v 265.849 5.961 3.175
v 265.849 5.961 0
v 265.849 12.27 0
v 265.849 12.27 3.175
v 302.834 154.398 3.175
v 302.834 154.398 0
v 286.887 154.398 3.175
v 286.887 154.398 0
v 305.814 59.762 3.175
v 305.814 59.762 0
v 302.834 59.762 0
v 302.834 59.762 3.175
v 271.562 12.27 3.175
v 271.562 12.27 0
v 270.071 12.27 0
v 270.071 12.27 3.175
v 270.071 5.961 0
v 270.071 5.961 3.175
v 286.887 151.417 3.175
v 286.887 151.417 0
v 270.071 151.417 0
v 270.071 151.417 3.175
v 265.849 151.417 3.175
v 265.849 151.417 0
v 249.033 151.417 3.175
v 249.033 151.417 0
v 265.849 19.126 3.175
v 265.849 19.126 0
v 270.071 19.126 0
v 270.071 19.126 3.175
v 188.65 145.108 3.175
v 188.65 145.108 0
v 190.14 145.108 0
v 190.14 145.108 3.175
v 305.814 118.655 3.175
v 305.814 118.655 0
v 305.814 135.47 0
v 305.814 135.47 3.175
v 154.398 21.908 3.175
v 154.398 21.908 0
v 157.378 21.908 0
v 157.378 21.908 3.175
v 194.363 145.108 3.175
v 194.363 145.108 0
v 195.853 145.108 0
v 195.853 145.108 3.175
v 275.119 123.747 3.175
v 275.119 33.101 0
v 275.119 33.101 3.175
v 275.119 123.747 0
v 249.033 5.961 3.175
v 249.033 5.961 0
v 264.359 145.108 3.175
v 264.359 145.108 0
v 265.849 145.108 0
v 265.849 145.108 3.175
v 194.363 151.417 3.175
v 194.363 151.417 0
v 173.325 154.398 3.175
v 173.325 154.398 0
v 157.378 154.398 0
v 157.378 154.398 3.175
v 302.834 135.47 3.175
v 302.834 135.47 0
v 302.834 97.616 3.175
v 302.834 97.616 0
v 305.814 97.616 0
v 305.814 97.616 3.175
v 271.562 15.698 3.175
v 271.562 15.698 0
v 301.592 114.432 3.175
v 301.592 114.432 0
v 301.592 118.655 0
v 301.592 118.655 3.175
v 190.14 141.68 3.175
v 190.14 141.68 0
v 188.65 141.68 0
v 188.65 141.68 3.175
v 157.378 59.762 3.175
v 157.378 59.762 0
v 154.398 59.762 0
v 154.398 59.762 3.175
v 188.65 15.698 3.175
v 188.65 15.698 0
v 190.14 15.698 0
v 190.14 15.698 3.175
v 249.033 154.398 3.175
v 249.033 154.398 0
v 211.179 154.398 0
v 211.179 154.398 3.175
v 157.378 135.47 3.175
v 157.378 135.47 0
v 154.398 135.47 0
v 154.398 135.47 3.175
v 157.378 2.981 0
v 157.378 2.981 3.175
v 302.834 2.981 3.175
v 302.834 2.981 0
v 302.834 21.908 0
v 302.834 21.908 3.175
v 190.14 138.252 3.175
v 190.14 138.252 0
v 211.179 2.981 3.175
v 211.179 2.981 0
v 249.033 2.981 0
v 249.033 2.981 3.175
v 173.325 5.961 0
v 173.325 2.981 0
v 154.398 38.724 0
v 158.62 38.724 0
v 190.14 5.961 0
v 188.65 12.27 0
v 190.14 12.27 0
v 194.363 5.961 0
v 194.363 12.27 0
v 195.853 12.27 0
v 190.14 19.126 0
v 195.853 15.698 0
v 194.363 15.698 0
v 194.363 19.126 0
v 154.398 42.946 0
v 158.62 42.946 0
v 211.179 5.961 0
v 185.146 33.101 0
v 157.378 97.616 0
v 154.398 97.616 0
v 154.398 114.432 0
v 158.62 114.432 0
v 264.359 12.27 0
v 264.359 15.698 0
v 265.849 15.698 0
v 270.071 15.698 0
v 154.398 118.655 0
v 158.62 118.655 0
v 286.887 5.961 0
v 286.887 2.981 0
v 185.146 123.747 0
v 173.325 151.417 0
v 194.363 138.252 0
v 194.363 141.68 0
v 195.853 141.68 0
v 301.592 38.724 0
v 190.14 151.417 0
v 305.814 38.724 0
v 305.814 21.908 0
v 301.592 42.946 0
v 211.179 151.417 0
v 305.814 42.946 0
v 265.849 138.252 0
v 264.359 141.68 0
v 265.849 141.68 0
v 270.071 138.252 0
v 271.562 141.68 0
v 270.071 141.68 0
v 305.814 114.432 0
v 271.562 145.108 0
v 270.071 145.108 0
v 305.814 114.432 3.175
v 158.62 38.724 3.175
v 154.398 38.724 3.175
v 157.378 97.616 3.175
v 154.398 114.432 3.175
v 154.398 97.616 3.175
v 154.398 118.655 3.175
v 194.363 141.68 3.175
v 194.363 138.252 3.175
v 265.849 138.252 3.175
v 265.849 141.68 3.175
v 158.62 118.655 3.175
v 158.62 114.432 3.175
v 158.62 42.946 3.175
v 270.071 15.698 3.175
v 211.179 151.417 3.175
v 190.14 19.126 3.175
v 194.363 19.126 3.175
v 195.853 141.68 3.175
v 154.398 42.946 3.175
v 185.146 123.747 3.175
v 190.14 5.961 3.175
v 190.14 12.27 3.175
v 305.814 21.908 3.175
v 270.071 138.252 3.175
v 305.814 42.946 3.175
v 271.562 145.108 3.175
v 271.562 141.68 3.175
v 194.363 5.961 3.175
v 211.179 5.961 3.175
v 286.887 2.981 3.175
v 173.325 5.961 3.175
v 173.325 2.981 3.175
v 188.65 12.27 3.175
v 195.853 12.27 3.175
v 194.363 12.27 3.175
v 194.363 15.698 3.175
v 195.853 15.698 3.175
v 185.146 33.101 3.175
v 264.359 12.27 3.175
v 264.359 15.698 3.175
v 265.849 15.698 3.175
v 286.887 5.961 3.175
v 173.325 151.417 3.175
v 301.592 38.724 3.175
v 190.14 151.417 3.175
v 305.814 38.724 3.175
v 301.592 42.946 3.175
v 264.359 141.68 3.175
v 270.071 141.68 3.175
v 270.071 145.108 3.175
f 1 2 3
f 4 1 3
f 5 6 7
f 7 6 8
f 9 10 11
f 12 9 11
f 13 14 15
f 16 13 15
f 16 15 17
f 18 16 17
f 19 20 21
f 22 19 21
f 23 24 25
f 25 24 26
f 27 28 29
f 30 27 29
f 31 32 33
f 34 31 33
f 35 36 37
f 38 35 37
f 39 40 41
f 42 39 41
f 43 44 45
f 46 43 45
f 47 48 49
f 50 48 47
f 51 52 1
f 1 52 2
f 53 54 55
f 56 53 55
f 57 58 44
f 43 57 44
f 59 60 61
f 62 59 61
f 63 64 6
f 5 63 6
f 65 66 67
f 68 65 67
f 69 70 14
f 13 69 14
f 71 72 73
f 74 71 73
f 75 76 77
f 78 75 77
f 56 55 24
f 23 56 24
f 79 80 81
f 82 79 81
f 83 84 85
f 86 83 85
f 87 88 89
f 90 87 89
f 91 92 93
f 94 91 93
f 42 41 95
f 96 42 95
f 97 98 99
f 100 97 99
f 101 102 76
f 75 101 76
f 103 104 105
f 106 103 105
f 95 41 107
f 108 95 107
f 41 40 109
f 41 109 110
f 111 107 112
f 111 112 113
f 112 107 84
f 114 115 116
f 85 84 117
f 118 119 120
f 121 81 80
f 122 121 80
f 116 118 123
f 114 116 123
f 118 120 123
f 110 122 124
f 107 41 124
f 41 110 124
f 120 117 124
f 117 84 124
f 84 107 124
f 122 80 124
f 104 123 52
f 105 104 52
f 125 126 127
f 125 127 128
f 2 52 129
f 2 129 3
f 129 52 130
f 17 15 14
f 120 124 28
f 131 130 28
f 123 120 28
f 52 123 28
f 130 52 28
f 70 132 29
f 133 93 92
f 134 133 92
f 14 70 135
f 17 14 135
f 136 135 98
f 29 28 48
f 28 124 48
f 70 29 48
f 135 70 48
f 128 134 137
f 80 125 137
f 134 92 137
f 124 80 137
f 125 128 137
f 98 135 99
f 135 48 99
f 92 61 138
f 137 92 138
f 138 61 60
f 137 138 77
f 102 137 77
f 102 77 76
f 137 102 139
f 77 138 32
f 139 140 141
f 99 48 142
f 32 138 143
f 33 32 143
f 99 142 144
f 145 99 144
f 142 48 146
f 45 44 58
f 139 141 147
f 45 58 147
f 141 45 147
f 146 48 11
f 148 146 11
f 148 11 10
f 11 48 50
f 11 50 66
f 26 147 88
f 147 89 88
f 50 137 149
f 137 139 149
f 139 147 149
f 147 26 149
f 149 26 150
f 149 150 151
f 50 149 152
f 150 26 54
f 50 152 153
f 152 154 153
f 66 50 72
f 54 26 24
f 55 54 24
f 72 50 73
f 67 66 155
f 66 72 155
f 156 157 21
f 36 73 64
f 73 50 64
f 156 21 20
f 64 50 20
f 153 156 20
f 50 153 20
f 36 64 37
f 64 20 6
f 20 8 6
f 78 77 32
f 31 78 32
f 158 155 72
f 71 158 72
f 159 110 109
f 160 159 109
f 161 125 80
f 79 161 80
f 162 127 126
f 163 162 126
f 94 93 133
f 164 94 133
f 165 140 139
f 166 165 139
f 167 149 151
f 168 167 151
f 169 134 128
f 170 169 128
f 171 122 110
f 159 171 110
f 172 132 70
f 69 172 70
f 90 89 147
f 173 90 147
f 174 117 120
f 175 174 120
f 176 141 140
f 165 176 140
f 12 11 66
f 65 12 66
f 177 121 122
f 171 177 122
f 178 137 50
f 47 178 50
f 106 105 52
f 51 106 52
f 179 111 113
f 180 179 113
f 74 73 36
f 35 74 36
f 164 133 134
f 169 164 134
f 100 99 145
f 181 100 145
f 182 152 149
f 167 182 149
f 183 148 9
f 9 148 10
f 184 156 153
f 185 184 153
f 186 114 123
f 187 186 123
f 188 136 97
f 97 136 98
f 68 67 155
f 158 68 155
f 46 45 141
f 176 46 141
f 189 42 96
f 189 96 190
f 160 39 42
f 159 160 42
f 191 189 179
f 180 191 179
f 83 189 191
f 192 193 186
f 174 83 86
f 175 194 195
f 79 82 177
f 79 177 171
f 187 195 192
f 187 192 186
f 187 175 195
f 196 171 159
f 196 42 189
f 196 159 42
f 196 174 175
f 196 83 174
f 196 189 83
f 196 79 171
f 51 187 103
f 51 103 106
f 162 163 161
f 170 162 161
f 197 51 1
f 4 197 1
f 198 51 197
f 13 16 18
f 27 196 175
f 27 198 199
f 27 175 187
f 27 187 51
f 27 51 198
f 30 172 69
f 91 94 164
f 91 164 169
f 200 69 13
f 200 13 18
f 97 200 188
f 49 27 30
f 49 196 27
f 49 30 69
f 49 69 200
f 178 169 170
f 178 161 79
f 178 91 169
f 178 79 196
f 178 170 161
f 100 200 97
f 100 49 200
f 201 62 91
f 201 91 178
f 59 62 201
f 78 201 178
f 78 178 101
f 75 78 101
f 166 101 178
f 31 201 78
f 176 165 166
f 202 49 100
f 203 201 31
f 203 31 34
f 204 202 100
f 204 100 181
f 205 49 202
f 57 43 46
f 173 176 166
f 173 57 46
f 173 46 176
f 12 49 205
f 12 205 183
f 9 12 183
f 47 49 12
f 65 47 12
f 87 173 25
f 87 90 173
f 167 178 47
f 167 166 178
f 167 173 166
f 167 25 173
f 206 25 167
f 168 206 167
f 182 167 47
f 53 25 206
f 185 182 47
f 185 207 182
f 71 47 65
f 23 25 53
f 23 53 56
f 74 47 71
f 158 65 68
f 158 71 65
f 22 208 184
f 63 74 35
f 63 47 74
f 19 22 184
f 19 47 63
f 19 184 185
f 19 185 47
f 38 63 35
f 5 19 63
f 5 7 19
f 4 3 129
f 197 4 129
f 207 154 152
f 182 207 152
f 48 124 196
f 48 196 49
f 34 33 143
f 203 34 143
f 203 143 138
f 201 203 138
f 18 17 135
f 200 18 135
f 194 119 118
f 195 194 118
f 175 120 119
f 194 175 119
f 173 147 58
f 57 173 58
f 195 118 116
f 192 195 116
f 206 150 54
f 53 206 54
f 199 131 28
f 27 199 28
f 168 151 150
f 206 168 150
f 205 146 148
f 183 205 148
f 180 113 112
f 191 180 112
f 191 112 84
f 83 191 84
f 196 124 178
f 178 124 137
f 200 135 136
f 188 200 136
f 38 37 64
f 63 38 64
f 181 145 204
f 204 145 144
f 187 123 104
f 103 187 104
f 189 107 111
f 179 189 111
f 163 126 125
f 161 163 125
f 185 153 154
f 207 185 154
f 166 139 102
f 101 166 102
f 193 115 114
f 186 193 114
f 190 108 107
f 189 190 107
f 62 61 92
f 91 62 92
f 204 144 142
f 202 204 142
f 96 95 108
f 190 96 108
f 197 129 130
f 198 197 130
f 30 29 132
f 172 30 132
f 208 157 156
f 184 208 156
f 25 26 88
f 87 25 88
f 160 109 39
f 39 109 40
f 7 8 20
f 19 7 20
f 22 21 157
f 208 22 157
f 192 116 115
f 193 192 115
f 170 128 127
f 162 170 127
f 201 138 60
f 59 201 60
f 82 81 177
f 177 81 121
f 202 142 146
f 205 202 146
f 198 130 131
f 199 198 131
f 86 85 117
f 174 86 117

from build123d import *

# Parameters (mm, degrees)
SKETCH1_W           = 89.973098965
SKETCH1_H           = 90.646237782
BOSS_EXTRUDE1_DEPTH = 3.175


with BuildPart() as part:
    # Sketch1 → Boss-Extrude1 (new body)
    with BuildSketch(Plane.XY):
        Polygon((157.378148634, 154.39750188), (157.378148634, 135.470394989), (154.39750188, 135.470394989), (154.39750188, 118.65457955), (158.620084782, 118.65457955), (158.620084782, 116.543288099), (158.620084782, 114.431996648), (154.39750188, 114.431996648), (154.39750188, 97.616181208), (157.378148634, 97.616181208), (157.378148634, 59.761967427), (154.39750188, 59.761967427), (154.39750188, 42.946151987), (158.620084782, 42.946151987), (158.620084782, 40.834860536), (158.620084782, 38.723569085), (154.39750188, 38.723569085), (154.39750188, 21.907753645), (157.378148634, 21.907753645), (157.378148634, 2.980646754), (173.324608771, 2.980646754), (173.324608771, 5.961293509), (190.14042421, 5.961293509), (190.14042421, 12.270329139), (188.650100833, 12.270329139), (188.650100833, 15.698072907), (190.14042421, 15.698072907), (190.14042421, 19.125816674), (194.363007113, 19.125816674), (194.363007113, 15.698072907), (195.85333049, 15.698072907), (195.85333049, 12.270329139), (194.363007113, 12.270329139), (194.363007113, 5.961293509), (211.178822552, 5.961293509), (211.178822552, 2.980646754), (249.033036334, 2.980646754), (249.033036334, 5.961293509), (265.848851773, 5.961293509), (265.848851773, 12.270329139), (264.358528396, 12.270329139), (264.358528396, 15.698072907), (265.848851773, 15.698072907), (265.848851773, 19.125816674), (270.071434675, 19.125816674), (270.071434675, 15.698072907), (271.561758053, 15.698072907), (271.561758053, 12.270329139), (270.071434675, 12.270329139), (270.071434675, 5.961293509), (286.887250115, 5.961293509), (286.887250115, 2.980646754), (302.833710251, 2.980646754), (302.833710251, 21.907753645), (305.814357006, 21.907753645), (305.814357006, 38.723569085), (301.591774104, 38.723569085), (301.591774104, 40.834860536), (301.591774104, 42.946151987), (305.814357006, 42.946151987), (305.814357006, 59.761967427), (302.833710251, 59.761967427), (302.833710251, 97.616181208), (305.814357006, 97.616181208), (305.814357006, 114.431996648), (301.591774104, 114.431996648), (301.591774104, 116.543288099), (301.591774104, 118.65457955), (305.814357006, 118.65457955), (305.814357006, 135.470394989), (302.833710251, 135.470394989), (302.833710251, 154.39750188), (286.887250115, 154.39750188), (286.887250115, 151.416855126), (270.071434675, 151.416855126), (270.071434675, 145.107819495), (271.561758053, 145.107819495), (271.561758053, 141.680075728), (270.071434675, 141.680075728), (270.071434675, 138.25233196), (265.848851773, 138.25233196), (265.848851773, 141.680075728), (264.358528396, 141.680075728), (264.358528396, 145.107819495), (265.848851773, 145.107819495), (265.848851773, 151.416855126), (249.033036334, 151.416855126), (249.033036334, 154.39750188), (211.178822552, 154.39750188), (211.178822552, 151.416855126), (194.363007113, 151.416855126), (194.363007113, 145.107819495), (195.85333049, 145.107819495), (195.85333049, 141.680075728), (194.363007113, 141.680075728), (194.363007113, 138.25233196), (190.14042421, 138.25233196), (190.14042421, 141.680075728), (188.650100833, 141.680075728), (188.650100833, 145.107819495), (190.14042421, 145.107819495), (190.14042421, 151.416855126), (173.324608771, 151.416855126), (173.324608771, 154.39750188), align=None)
        with Locations((230.132306119, 78.423957663)):
            Rectangle(SKETCH1_W, SKETCH1_H, mode=Mode.SUBTRACT)
    extrude(amount=BOSS_EXTRUDE1_DEPTH)


solid = part.part
